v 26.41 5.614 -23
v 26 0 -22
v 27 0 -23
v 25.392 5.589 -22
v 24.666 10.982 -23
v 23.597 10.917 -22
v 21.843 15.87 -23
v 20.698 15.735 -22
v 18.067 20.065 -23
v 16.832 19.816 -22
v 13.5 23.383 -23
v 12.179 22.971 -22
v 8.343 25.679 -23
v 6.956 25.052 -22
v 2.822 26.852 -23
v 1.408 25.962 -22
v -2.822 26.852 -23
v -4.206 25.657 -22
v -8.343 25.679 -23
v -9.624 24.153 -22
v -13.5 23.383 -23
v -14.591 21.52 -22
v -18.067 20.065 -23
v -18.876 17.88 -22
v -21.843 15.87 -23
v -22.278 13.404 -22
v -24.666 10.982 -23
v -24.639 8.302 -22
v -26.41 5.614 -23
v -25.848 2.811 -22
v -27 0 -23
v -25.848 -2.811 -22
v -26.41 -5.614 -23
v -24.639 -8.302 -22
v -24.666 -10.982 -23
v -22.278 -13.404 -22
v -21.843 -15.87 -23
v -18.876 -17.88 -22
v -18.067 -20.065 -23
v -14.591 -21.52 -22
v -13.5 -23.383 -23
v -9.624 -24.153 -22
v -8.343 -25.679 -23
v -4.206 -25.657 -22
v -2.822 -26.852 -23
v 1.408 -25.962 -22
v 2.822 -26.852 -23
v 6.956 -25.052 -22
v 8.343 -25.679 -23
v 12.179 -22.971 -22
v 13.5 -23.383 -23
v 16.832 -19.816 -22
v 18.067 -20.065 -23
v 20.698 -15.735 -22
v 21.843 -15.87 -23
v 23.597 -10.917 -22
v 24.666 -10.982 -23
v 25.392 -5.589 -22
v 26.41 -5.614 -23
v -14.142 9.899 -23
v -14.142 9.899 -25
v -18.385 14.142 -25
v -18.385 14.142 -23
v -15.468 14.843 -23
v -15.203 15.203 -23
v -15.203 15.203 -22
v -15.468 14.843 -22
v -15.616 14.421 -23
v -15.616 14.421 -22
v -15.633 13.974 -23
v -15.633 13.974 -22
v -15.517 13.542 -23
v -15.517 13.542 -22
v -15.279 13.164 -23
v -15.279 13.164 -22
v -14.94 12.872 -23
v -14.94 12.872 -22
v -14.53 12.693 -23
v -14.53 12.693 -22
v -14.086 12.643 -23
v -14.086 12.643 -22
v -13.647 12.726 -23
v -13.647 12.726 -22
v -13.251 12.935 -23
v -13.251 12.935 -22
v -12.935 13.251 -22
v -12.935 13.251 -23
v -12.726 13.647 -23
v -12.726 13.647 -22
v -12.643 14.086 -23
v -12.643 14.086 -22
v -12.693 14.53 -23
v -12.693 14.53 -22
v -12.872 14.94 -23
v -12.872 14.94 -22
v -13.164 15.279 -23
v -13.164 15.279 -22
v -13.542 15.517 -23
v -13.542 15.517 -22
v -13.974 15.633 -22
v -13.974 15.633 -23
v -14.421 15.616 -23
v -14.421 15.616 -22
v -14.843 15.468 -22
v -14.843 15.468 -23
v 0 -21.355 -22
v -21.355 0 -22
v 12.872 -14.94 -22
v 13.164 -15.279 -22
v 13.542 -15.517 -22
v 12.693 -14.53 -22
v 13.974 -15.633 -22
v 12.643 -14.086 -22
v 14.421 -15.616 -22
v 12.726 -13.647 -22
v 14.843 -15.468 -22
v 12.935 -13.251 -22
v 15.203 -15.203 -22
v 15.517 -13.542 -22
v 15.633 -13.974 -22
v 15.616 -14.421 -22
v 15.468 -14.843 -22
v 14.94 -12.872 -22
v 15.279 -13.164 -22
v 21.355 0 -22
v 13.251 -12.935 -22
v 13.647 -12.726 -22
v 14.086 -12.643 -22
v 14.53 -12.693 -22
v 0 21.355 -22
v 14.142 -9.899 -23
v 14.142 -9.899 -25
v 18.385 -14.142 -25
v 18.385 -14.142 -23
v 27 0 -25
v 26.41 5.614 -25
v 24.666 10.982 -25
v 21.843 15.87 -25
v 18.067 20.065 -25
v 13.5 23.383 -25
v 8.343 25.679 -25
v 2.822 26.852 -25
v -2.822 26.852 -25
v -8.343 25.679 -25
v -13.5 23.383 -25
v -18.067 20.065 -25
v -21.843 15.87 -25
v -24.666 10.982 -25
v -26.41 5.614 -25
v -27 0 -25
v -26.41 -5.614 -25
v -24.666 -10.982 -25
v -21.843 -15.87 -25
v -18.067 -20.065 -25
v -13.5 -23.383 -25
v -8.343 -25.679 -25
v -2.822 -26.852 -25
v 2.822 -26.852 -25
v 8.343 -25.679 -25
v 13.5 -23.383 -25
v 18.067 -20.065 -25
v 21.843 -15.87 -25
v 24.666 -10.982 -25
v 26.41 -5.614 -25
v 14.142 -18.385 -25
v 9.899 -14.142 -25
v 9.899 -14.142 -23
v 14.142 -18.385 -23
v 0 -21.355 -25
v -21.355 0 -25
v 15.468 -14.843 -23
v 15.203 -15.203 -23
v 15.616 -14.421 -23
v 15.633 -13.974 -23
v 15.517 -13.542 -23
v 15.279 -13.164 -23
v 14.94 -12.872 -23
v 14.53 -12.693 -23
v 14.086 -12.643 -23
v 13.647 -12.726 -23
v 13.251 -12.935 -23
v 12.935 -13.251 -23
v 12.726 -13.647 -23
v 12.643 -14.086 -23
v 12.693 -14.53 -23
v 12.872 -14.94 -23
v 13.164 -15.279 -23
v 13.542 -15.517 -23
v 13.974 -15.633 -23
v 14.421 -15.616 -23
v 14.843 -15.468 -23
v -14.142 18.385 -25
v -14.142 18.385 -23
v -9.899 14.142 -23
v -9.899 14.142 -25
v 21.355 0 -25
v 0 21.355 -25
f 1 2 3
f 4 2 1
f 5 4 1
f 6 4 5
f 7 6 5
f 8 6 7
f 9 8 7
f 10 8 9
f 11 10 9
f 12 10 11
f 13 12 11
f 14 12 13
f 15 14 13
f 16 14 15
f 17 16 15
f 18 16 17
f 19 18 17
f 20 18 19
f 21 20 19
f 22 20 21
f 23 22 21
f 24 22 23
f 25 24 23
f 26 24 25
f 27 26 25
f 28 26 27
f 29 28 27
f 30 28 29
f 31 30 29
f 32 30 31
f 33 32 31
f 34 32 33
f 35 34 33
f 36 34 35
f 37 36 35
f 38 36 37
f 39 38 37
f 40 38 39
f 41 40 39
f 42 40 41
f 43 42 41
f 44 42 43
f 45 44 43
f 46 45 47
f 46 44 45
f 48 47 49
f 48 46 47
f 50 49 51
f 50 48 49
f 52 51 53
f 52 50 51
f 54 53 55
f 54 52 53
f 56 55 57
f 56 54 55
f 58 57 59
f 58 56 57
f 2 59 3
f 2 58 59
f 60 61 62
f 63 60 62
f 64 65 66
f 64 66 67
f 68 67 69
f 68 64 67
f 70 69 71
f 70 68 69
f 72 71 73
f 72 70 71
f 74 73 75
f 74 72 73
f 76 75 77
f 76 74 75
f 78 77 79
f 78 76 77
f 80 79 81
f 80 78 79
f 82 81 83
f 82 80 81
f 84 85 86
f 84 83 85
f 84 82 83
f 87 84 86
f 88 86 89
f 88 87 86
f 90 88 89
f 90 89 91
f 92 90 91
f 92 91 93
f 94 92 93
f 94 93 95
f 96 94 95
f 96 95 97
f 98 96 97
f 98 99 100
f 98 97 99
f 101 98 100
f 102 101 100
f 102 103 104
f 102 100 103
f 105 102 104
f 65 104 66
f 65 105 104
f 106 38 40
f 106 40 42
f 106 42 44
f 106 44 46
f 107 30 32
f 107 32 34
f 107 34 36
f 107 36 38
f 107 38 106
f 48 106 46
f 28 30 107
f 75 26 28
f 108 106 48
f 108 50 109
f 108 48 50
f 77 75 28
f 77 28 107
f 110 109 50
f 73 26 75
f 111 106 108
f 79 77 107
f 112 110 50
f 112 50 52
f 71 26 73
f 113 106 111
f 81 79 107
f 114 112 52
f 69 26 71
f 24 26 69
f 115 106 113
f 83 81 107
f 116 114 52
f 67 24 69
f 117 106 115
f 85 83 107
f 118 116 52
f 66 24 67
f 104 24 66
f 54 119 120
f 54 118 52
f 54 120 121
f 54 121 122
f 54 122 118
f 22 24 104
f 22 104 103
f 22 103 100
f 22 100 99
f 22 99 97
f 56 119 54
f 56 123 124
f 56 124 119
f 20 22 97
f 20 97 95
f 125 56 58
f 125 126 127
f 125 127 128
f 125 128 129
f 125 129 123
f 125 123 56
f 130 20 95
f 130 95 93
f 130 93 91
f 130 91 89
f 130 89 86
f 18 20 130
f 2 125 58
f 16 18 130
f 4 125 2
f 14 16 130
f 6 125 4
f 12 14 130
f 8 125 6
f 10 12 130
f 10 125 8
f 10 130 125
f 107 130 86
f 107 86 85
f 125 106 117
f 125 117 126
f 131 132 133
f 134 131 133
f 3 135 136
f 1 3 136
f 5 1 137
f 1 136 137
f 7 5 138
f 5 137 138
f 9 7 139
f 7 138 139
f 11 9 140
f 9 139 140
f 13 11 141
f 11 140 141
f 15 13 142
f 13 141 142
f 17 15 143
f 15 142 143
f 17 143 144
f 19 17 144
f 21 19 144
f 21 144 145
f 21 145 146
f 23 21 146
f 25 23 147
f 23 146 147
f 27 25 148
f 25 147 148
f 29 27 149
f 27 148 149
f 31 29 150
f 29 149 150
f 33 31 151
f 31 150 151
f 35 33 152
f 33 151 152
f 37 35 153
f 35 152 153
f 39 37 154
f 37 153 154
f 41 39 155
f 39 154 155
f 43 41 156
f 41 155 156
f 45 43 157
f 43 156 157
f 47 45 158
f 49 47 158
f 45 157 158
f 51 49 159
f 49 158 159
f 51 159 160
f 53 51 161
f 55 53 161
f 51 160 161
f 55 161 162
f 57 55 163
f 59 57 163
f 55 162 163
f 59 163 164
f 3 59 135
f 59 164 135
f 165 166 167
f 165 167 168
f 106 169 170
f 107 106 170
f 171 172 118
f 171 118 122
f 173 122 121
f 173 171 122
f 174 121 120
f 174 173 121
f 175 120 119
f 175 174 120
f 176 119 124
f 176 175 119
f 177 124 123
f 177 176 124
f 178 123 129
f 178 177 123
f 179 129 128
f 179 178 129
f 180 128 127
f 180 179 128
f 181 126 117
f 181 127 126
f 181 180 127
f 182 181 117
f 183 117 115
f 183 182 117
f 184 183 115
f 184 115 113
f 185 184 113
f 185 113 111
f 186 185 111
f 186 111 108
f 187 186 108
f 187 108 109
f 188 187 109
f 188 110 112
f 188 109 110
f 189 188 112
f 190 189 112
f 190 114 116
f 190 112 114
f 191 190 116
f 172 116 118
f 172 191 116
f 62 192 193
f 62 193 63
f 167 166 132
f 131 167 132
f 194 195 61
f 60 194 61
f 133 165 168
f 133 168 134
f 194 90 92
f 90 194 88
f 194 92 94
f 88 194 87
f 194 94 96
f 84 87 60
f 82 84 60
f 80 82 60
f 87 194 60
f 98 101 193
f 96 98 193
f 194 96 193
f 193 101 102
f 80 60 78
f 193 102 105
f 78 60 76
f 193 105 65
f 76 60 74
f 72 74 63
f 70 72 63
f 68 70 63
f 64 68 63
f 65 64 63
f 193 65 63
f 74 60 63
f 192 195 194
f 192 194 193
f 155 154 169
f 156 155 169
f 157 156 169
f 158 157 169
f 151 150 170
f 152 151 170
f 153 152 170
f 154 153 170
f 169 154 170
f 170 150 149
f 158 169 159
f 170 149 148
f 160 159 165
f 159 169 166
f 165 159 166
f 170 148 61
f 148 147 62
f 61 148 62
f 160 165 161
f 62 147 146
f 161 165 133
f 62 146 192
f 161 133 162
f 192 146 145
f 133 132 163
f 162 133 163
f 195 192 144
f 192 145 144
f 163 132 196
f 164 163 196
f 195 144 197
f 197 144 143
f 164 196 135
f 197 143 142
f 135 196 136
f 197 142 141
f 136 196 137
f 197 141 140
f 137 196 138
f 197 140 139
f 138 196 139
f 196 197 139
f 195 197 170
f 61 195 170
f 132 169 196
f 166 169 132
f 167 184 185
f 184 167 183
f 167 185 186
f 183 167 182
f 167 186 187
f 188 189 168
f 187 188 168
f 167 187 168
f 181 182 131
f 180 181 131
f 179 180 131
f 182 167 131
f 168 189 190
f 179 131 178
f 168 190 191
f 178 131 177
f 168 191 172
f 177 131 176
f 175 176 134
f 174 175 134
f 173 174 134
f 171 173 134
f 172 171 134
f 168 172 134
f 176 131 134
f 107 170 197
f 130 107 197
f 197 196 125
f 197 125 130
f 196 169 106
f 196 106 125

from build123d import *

# Parameters (mm, degrees)
BOX318_W                    = 6
BOX318_H                    = 6
BOX318_DEPTH                = 20
BOX318_PLACEMENT_ANGLE      = 45
BOX319_W                    = 6
BOX319_H                    = 6
BOX319_DEPTH                = 20
BOX319_PLACEMENT_ANGLE      = 135
CYLINDER809_R               = 1.5
CYLINDER809_DEPTH           = 20
CYLINDER809_PLACEMENT_ANGLE = 135
CYLINDER808_R               = 1.5
CYLINDER808_DEPTH           = 20
CYLINDER808_PLACEMENT_ANGLE = 45
BOX315_W                    = 30.2
BOX315_H                    = 30.2
BOX315_DEPTH                = 100
BOX315_PLACEMENT_ANGLE      = 45
CYLINDER805_R               = 27
CYLINDER805_DEPTH           = 3
CHAMFER_SIZE                = 1


with BuildPart() as krychle318:
    # Box318 → Box318 (new body)
    with BuildSketch(Plane.XY):
        with Locations((3, 3)):
            Rectangle(BOX318_W, BOX318_H)
    extrude(amount=BOX318_DEPTH)


with BuildPart() as krychle318_1:
    # Box318 placement: moved
    add(krychle318.part.moved(Location((9.899495, -14.142136, -30))).rotate(Axis((9.899495, -14.142136, -30), (0, 0, -1)), BOX318_PLACEMENT_ANGLE))


with BuildPart() as compound722:
    # Box319 → Box319 (new body)
    with BuildSketch(Plane.XY):
        with Locations((3, 3)):
            Rectangle(BOX319_W, BOX319_H)
    extrude(amount=BOX319_DEPTH)


with BuildPart() as compound722_1:
    # Box319 placement: moved
    add(compound722.part.moved(Location((-9.899495, 14.142136, -30))).rotate(Axis((-9.899495, 14.142136, -30), (0, 0, 1)), BOX319_PLACEMENT_ANGLE))

    # Compound722: union Krychle318
    add(krychle318_1.part)


with BuildPart() as compound722_2:
    # Compound722 placement: moved
    add(compound722_1.part.moved(Location((0, 0, -13))))


with BuildPart() as v_lec809:
    # Cylinder809 → Cylinder809 (new body)
    with BuildSketch(Plane.XY):
        Circle(CYLINDER809_R)
    extrude(amount=CYLINDER809_DEPTH)


with BuildPart() as v_lec809_1:
    # Cylinder809 placement: moved
    add(v_lec809.part.moved(Location((-14.142136, 14.142136, -30))).rotate(Axis((-14.142136, 14.142136, -30), (0, 0, 1)), CYLINDER809_PLACEMENT_ANGLE))


with BuildPart() as compound:
    # Cylinder808 → Cylinder808 (new body)
    with BuildSketch(Plane.XY):
        Circle(CYLINDER808_R)
    extrude(amount=CYLINDER808_DEPTH)


with BuildPart() as compound_1:
    # Cylinder808 placement: moved
    add(compound.part.moved(Location((14.142136, -14.142136, -30))).rotate(Axis((14.142136, -14.142136, -30), (0, 0, -1)), CYLINDER808_PLACEMENT_ANGLE))

    # Compound: union Válec809
    add(v_lec809_1.part)


with BuildPart() as krychle315:
    # Box315 → Box315 (new body)
    with BuildSketch(Plane.XY):
        with Locations((15.1, 15.1)):
            Rectangle(BOX315_W, BOX315_H)
    extrude(amount=BOX315_DEPTH)


with BuildPart() as krychle315_1:
    # Box315 placement: moved
    add(krychle315.part.moved(Location((0, -21.354625, -30))).rotate(Axis((0, -21.354625, -30), (0, 0, 1)), BOX315_PLACEMENT_ANGLE))


with BuildPart() as cut344:
    # Cylinder805 → Cylinder805 (new body)
    with BuildSketch(Plane.XY.offset(-25)):
        Circle(CYLINDER805_R)
    extrude(amount=CYLINDER805_DEPTH)

    # Chamfer
    chamfer_edges = [cut344.edges().sort_by_distance(p)[0] for p in [
        (-27, 0, -22),
    ]]
    chamfer(chamfer_edges, length=CHAMFER_SIZE)

    # Cut340: cut Krychle315
    add(krychle315_1.part, mode=Mode.SUBTRACT)

    # Cut342: cut Compound
    add(compound_1.part, mode=Mode.SUBTRACT)

    # Cut344: cut Compound722
    add(compound722_2.part, mode=Mode.SUBTRACT)


solid = cut344.part
